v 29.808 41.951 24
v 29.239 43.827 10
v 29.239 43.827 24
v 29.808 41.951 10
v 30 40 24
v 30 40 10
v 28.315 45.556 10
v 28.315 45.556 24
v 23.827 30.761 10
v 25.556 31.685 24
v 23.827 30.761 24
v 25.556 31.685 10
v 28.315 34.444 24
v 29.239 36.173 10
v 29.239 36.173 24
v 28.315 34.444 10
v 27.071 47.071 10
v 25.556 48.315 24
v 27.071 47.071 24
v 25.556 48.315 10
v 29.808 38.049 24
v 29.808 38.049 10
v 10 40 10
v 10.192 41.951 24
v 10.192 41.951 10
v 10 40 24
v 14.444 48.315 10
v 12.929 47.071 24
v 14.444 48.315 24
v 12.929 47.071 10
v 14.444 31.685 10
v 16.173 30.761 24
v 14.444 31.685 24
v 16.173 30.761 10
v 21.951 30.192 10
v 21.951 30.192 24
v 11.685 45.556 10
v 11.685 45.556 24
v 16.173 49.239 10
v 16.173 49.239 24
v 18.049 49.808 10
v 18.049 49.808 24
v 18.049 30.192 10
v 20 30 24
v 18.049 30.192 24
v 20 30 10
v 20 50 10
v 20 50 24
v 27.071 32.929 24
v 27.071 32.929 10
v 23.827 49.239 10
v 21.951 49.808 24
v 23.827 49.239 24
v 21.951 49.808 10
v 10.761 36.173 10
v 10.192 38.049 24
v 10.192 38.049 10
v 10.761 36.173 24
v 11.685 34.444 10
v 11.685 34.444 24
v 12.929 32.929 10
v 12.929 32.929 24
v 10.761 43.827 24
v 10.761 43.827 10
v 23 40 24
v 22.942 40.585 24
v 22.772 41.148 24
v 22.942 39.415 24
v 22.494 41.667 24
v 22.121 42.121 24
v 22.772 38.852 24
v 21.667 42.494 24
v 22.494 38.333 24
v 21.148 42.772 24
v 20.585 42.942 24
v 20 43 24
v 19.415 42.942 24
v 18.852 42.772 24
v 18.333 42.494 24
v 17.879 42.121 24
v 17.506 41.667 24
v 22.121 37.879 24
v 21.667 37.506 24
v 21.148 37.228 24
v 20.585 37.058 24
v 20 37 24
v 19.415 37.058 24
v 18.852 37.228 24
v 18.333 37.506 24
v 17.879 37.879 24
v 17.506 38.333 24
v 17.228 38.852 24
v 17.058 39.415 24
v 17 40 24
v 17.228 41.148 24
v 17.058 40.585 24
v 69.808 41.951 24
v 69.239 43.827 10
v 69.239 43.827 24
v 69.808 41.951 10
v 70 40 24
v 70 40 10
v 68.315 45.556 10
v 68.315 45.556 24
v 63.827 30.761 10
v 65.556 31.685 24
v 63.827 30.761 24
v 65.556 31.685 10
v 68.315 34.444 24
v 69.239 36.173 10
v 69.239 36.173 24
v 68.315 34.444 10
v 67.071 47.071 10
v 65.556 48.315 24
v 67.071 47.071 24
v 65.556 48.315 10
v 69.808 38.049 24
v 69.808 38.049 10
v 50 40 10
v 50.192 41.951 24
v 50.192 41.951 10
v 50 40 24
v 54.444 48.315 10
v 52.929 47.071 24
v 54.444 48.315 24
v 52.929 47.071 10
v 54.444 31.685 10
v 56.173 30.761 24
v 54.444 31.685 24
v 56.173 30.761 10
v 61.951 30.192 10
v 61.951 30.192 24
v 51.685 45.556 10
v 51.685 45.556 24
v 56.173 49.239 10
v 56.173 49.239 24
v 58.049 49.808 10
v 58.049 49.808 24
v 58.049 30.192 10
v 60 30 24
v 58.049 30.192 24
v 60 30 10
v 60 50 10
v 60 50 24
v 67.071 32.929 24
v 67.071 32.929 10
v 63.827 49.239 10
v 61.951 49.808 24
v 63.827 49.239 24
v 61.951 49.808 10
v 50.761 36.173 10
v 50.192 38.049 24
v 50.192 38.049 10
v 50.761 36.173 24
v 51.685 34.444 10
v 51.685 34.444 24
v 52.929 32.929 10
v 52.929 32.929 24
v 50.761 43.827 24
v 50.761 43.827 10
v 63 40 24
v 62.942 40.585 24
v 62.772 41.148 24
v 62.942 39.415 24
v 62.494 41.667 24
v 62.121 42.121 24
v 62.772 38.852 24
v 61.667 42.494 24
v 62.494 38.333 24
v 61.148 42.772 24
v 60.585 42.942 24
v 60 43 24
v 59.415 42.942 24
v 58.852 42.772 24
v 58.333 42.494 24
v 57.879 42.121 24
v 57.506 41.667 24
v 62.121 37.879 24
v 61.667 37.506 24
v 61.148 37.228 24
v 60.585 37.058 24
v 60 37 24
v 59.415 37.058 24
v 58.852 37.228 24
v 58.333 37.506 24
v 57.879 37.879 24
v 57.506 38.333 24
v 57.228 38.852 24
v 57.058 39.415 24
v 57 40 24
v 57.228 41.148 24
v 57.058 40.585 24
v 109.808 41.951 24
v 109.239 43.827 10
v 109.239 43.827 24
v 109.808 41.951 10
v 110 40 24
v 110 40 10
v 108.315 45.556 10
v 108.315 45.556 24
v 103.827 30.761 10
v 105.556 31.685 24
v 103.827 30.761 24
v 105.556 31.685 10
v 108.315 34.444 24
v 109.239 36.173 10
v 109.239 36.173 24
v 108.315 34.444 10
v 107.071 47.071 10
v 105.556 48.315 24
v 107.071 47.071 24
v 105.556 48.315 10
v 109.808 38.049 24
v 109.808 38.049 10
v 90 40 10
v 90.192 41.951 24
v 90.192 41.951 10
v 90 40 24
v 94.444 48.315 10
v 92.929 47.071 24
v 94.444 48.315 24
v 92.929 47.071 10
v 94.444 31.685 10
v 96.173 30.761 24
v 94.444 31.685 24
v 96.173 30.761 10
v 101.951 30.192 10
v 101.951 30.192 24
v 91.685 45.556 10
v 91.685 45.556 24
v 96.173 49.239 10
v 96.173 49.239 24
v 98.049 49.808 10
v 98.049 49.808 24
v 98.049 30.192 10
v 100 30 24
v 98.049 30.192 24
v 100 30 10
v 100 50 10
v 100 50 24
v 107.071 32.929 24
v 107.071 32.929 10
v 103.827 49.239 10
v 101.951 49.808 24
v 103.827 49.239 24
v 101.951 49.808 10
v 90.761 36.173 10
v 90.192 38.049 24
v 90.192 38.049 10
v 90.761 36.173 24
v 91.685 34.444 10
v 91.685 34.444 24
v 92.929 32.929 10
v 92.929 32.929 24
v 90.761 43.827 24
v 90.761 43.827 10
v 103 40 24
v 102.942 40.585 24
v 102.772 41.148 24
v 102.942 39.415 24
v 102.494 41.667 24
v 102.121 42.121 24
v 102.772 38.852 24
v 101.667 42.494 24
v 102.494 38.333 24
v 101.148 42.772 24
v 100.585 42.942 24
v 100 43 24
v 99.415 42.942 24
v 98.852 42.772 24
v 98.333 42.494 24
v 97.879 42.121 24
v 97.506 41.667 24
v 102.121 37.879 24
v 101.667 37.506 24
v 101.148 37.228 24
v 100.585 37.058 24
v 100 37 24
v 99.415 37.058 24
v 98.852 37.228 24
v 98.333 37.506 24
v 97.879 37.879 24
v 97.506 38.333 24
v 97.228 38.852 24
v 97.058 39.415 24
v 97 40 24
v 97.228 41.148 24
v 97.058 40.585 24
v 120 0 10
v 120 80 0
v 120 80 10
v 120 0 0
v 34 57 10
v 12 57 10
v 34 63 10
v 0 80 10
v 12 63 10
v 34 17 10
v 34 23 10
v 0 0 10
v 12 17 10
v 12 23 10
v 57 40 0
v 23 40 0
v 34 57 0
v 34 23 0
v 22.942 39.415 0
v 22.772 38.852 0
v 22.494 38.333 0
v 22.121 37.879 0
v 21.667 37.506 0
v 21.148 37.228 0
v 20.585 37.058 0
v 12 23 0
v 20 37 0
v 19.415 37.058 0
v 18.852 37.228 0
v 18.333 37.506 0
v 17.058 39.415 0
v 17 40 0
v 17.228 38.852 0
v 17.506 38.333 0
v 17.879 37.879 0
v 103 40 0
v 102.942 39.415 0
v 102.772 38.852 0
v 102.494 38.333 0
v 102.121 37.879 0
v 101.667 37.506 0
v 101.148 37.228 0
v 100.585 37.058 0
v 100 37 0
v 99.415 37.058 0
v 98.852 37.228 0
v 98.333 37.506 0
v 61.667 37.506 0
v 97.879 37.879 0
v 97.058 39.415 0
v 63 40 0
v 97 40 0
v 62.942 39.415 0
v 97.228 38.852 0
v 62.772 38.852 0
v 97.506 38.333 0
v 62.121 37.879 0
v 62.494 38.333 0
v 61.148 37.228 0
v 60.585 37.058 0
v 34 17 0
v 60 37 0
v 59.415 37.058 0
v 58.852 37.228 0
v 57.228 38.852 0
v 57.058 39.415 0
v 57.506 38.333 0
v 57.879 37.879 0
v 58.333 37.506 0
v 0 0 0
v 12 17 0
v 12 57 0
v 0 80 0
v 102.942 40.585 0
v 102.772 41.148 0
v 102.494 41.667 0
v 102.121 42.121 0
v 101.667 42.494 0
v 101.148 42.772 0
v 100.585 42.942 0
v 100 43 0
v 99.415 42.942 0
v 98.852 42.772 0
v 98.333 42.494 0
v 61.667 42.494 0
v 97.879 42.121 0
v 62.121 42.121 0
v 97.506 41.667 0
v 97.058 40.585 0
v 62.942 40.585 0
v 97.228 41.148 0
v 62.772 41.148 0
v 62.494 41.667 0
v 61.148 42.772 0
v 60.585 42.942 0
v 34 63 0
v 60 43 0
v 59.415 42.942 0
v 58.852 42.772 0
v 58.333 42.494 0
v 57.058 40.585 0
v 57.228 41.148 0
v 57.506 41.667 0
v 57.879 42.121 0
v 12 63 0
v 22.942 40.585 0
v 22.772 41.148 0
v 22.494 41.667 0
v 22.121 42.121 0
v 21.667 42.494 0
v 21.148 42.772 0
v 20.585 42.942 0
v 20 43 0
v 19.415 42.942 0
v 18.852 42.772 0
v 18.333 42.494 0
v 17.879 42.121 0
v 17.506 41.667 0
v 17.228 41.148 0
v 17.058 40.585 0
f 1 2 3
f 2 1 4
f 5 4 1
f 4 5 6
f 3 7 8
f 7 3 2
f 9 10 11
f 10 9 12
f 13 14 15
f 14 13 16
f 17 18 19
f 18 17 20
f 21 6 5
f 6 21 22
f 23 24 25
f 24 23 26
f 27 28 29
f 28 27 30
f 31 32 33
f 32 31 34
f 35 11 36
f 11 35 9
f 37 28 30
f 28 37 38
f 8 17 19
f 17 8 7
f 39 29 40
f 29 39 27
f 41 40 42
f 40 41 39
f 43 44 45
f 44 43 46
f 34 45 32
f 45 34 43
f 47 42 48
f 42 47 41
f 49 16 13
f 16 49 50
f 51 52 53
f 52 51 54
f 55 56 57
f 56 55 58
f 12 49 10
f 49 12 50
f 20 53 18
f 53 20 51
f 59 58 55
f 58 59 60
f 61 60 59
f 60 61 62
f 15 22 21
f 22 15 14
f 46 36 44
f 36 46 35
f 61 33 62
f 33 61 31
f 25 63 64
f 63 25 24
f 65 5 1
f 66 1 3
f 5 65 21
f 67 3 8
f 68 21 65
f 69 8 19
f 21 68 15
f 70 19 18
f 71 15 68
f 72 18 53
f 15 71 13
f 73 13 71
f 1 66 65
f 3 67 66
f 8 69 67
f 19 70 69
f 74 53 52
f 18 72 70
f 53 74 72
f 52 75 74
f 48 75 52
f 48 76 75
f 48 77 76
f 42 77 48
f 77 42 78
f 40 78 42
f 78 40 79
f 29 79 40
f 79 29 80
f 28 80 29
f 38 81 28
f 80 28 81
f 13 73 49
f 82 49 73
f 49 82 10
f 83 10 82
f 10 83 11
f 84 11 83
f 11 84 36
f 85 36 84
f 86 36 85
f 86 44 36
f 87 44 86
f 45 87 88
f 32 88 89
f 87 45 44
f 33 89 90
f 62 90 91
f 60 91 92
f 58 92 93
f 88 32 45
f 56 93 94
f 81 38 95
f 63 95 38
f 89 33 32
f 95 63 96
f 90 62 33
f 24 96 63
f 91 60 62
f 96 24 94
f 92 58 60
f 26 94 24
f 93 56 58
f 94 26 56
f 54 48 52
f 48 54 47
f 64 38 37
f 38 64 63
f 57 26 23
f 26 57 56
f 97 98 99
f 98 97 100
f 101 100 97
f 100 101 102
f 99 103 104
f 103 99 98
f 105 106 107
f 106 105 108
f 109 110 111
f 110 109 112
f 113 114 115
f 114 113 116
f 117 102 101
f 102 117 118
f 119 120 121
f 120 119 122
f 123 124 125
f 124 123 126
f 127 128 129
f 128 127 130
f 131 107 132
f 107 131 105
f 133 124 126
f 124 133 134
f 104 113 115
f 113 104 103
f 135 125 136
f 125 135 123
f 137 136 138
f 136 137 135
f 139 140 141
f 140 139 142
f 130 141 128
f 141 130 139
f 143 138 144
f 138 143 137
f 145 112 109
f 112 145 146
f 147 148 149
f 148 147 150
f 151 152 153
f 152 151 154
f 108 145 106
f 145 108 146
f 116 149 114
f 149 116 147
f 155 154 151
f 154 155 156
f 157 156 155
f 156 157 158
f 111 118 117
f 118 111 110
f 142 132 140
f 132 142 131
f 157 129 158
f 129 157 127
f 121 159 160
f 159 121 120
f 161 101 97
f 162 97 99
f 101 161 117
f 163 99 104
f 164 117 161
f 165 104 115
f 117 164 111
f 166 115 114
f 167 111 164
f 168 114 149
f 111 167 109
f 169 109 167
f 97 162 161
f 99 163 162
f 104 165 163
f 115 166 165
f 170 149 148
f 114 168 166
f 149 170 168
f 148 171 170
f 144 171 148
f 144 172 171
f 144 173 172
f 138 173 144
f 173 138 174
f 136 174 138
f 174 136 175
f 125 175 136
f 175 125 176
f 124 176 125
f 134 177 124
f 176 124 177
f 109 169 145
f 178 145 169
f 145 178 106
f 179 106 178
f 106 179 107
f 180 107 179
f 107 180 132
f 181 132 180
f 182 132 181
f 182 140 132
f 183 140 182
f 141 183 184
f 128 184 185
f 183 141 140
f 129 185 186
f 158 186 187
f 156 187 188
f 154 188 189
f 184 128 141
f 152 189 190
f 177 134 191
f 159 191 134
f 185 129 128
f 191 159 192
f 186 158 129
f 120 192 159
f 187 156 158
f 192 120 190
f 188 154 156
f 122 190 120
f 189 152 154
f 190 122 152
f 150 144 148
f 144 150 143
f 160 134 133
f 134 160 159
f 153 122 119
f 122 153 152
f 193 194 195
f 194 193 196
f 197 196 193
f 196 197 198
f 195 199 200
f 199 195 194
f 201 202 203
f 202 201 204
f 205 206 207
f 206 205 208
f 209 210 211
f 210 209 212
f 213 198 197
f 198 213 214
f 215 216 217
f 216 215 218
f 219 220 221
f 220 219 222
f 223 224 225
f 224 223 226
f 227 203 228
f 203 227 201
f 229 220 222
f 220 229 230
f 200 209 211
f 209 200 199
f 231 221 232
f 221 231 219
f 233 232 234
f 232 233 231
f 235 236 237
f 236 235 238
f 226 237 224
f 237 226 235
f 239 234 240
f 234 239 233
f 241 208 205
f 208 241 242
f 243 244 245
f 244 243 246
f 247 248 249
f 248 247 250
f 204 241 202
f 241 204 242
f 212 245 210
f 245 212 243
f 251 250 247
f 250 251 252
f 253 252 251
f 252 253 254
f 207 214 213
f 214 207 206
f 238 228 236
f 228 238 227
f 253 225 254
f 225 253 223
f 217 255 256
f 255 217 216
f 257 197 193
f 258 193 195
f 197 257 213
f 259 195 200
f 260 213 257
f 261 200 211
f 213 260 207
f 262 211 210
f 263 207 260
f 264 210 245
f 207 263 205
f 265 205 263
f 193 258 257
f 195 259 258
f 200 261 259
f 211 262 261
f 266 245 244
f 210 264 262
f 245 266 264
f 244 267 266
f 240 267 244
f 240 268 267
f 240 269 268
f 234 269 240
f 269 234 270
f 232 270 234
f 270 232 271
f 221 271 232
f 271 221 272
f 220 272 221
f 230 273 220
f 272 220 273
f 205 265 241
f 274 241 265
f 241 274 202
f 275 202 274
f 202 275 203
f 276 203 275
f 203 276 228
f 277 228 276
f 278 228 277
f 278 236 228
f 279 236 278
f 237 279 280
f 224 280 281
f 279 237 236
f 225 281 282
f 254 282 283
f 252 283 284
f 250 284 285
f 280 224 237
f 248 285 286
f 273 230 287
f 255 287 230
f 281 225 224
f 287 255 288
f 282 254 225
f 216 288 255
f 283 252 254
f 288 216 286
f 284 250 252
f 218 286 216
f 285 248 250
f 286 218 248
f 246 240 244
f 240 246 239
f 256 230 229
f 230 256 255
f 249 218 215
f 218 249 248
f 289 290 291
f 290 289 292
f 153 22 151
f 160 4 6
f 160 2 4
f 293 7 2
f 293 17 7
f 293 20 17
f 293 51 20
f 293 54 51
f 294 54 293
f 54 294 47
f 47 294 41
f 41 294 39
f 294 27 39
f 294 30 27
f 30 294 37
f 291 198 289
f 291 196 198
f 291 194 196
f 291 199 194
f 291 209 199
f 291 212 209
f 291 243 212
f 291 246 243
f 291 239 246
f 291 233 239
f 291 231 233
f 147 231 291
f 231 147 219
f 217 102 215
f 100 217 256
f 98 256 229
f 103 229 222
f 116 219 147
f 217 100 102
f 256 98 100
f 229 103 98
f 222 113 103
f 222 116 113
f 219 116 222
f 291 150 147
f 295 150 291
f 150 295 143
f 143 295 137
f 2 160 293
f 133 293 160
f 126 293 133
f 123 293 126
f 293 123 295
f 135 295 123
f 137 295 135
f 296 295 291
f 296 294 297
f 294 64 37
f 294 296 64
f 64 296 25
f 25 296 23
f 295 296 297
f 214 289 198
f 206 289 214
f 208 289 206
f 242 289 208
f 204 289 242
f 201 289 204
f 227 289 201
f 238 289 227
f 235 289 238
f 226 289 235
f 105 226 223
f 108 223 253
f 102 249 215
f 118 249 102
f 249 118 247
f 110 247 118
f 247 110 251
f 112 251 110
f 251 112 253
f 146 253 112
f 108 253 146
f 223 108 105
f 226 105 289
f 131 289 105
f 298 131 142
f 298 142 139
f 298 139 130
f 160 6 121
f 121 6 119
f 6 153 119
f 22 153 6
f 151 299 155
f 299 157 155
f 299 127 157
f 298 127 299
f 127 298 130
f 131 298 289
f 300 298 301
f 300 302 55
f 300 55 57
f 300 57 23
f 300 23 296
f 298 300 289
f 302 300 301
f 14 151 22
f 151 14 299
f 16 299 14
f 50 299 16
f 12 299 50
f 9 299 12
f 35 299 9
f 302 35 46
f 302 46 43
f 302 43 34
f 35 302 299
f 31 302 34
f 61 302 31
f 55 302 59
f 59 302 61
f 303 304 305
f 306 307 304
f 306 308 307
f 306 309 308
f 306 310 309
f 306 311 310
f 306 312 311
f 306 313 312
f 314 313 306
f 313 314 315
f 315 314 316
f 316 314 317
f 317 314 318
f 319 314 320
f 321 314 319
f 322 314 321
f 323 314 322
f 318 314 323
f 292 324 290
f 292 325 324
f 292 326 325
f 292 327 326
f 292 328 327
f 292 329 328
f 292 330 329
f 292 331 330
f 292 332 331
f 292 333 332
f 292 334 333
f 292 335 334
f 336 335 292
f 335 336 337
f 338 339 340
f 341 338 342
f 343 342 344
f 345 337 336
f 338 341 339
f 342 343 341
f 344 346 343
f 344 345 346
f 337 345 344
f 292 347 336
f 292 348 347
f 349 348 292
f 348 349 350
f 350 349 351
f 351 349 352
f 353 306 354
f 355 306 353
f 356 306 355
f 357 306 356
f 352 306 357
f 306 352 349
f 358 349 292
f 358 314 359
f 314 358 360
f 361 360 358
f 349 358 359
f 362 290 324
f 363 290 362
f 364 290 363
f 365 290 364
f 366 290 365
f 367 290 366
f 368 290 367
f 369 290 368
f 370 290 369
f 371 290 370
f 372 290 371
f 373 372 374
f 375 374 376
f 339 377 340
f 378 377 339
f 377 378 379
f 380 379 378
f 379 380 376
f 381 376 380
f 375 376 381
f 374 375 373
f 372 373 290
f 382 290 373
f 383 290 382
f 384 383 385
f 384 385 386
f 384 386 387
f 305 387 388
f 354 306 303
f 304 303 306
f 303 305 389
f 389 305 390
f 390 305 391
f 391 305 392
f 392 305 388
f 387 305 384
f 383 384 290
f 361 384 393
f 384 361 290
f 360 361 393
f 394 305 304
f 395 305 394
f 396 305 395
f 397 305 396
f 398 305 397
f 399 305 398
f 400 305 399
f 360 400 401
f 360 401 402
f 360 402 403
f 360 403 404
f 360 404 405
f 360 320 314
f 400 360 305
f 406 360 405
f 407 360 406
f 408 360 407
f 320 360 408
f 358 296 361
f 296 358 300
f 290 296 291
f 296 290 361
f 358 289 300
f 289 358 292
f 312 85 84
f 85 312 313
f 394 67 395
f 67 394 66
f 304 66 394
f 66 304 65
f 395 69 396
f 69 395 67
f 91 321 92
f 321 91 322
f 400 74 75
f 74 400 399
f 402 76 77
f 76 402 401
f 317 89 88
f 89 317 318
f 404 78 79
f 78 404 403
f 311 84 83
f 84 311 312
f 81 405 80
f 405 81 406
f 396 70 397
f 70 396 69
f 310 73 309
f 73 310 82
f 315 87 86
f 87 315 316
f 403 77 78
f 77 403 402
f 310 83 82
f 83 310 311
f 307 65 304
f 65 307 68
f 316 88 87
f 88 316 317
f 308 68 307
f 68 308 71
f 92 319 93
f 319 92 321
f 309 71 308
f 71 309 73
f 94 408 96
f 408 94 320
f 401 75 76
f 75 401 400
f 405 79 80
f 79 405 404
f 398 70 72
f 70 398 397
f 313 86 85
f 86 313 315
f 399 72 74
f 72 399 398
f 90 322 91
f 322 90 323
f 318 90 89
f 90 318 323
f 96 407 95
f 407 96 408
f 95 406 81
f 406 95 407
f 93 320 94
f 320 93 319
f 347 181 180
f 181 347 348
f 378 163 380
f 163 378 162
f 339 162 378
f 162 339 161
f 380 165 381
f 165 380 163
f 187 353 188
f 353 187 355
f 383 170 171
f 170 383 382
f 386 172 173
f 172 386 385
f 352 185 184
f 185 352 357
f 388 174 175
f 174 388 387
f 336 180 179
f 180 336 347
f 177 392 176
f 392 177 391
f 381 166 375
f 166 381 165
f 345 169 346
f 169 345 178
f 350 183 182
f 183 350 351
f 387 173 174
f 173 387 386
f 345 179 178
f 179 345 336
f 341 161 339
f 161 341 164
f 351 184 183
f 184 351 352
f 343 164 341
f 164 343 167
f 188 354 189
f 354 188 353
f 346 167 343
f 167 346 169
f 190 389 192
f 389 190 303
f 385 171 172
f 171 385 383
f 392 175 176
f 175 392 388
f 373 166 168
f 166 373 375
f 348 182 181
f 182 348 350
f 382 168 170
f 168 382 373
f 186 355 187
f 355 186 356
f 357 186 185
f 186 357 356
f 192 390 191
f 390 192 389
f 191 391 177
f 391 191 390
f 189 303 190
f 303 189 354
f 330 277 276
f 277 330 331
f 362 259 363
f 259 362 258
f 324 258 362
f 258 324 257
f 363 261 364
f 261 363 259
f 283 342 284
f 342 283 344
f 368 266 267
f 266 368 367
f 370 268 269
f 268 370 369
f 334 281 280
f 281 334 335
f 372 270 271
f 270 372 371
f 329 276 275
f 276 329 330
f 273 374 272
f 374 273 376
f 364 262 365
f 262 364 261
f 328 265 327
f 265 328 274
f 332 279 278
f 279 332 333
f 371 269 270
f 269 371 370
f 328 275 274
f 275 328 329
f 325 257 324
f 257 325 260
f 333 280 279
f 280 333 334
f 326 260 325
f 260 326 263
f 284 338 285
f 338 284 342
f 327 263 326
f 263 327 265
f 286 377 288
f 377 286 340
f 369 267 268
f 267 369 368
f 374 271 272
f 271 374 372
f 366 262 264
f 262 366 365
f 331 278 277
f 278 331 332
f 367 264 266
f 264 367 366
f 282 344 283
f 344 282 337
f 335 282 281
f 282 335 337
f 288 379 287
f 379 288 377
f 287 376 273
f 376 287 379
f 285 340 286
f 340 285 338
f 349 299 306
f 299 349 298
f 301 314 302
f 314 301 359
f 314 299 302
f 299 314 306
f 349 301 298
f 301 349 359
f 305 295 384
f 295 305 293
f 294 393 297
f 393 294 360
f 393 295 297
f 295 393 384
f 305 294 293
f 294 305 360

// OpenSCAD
$fn = 32;

// ----------------------------------------------------------------------
// Drill jig: three_boss_slot jig
// ----------------------------------------------------------------------

// --- parameters (mm) ---
plate_l = 120;            // plate length, X
plate_w = 80;             // plate width, Y
plate_t = 10;             // plate thickness
boss_d = 20;              // guide boss diameter
boss_h = 15;              // boss height above the plate
guide_d = 6;              // guide hole diameter
boss_pitch = 40;          // boss pitch
slot_w = 6;               // clamp slot width
slot_l = 22;              // clamp slot length
slot_x = 12;              // slot start X

n_boss = 3;  // guide bosses
boss_x0 = (plate_l - (n_boss - 1) * boss_pitch) / 2;  // first boss X
boss_top = plate_t - 1 + boss_h;  // boss crown height
total_h = boss_top;  // overall height

difference() {
  union() {
  cube([plate_l, plate_w, plate_t]);
  for (i = [0 : n_boss - 1])
    translate([boss_x0 + i * boss_pitch, plate_w / 2, plate_t - 1])
      cylinder(h = boss_h, d = boss_d);
  }
  for (i = [0 : n_boss - 1])
    translate([boss_x0 + i * boss_pitch, plate_w / 2, -1])
      cylinder(h = plate_t + boss_h, d = guide_d);
  for (cy = [plate_w * 0.25, plate_w * 0.75])
    translate([slot_x, cy - slot_w / 2, -1])
      cube([slot_l, slot_w, plate_t + 2]);
}
